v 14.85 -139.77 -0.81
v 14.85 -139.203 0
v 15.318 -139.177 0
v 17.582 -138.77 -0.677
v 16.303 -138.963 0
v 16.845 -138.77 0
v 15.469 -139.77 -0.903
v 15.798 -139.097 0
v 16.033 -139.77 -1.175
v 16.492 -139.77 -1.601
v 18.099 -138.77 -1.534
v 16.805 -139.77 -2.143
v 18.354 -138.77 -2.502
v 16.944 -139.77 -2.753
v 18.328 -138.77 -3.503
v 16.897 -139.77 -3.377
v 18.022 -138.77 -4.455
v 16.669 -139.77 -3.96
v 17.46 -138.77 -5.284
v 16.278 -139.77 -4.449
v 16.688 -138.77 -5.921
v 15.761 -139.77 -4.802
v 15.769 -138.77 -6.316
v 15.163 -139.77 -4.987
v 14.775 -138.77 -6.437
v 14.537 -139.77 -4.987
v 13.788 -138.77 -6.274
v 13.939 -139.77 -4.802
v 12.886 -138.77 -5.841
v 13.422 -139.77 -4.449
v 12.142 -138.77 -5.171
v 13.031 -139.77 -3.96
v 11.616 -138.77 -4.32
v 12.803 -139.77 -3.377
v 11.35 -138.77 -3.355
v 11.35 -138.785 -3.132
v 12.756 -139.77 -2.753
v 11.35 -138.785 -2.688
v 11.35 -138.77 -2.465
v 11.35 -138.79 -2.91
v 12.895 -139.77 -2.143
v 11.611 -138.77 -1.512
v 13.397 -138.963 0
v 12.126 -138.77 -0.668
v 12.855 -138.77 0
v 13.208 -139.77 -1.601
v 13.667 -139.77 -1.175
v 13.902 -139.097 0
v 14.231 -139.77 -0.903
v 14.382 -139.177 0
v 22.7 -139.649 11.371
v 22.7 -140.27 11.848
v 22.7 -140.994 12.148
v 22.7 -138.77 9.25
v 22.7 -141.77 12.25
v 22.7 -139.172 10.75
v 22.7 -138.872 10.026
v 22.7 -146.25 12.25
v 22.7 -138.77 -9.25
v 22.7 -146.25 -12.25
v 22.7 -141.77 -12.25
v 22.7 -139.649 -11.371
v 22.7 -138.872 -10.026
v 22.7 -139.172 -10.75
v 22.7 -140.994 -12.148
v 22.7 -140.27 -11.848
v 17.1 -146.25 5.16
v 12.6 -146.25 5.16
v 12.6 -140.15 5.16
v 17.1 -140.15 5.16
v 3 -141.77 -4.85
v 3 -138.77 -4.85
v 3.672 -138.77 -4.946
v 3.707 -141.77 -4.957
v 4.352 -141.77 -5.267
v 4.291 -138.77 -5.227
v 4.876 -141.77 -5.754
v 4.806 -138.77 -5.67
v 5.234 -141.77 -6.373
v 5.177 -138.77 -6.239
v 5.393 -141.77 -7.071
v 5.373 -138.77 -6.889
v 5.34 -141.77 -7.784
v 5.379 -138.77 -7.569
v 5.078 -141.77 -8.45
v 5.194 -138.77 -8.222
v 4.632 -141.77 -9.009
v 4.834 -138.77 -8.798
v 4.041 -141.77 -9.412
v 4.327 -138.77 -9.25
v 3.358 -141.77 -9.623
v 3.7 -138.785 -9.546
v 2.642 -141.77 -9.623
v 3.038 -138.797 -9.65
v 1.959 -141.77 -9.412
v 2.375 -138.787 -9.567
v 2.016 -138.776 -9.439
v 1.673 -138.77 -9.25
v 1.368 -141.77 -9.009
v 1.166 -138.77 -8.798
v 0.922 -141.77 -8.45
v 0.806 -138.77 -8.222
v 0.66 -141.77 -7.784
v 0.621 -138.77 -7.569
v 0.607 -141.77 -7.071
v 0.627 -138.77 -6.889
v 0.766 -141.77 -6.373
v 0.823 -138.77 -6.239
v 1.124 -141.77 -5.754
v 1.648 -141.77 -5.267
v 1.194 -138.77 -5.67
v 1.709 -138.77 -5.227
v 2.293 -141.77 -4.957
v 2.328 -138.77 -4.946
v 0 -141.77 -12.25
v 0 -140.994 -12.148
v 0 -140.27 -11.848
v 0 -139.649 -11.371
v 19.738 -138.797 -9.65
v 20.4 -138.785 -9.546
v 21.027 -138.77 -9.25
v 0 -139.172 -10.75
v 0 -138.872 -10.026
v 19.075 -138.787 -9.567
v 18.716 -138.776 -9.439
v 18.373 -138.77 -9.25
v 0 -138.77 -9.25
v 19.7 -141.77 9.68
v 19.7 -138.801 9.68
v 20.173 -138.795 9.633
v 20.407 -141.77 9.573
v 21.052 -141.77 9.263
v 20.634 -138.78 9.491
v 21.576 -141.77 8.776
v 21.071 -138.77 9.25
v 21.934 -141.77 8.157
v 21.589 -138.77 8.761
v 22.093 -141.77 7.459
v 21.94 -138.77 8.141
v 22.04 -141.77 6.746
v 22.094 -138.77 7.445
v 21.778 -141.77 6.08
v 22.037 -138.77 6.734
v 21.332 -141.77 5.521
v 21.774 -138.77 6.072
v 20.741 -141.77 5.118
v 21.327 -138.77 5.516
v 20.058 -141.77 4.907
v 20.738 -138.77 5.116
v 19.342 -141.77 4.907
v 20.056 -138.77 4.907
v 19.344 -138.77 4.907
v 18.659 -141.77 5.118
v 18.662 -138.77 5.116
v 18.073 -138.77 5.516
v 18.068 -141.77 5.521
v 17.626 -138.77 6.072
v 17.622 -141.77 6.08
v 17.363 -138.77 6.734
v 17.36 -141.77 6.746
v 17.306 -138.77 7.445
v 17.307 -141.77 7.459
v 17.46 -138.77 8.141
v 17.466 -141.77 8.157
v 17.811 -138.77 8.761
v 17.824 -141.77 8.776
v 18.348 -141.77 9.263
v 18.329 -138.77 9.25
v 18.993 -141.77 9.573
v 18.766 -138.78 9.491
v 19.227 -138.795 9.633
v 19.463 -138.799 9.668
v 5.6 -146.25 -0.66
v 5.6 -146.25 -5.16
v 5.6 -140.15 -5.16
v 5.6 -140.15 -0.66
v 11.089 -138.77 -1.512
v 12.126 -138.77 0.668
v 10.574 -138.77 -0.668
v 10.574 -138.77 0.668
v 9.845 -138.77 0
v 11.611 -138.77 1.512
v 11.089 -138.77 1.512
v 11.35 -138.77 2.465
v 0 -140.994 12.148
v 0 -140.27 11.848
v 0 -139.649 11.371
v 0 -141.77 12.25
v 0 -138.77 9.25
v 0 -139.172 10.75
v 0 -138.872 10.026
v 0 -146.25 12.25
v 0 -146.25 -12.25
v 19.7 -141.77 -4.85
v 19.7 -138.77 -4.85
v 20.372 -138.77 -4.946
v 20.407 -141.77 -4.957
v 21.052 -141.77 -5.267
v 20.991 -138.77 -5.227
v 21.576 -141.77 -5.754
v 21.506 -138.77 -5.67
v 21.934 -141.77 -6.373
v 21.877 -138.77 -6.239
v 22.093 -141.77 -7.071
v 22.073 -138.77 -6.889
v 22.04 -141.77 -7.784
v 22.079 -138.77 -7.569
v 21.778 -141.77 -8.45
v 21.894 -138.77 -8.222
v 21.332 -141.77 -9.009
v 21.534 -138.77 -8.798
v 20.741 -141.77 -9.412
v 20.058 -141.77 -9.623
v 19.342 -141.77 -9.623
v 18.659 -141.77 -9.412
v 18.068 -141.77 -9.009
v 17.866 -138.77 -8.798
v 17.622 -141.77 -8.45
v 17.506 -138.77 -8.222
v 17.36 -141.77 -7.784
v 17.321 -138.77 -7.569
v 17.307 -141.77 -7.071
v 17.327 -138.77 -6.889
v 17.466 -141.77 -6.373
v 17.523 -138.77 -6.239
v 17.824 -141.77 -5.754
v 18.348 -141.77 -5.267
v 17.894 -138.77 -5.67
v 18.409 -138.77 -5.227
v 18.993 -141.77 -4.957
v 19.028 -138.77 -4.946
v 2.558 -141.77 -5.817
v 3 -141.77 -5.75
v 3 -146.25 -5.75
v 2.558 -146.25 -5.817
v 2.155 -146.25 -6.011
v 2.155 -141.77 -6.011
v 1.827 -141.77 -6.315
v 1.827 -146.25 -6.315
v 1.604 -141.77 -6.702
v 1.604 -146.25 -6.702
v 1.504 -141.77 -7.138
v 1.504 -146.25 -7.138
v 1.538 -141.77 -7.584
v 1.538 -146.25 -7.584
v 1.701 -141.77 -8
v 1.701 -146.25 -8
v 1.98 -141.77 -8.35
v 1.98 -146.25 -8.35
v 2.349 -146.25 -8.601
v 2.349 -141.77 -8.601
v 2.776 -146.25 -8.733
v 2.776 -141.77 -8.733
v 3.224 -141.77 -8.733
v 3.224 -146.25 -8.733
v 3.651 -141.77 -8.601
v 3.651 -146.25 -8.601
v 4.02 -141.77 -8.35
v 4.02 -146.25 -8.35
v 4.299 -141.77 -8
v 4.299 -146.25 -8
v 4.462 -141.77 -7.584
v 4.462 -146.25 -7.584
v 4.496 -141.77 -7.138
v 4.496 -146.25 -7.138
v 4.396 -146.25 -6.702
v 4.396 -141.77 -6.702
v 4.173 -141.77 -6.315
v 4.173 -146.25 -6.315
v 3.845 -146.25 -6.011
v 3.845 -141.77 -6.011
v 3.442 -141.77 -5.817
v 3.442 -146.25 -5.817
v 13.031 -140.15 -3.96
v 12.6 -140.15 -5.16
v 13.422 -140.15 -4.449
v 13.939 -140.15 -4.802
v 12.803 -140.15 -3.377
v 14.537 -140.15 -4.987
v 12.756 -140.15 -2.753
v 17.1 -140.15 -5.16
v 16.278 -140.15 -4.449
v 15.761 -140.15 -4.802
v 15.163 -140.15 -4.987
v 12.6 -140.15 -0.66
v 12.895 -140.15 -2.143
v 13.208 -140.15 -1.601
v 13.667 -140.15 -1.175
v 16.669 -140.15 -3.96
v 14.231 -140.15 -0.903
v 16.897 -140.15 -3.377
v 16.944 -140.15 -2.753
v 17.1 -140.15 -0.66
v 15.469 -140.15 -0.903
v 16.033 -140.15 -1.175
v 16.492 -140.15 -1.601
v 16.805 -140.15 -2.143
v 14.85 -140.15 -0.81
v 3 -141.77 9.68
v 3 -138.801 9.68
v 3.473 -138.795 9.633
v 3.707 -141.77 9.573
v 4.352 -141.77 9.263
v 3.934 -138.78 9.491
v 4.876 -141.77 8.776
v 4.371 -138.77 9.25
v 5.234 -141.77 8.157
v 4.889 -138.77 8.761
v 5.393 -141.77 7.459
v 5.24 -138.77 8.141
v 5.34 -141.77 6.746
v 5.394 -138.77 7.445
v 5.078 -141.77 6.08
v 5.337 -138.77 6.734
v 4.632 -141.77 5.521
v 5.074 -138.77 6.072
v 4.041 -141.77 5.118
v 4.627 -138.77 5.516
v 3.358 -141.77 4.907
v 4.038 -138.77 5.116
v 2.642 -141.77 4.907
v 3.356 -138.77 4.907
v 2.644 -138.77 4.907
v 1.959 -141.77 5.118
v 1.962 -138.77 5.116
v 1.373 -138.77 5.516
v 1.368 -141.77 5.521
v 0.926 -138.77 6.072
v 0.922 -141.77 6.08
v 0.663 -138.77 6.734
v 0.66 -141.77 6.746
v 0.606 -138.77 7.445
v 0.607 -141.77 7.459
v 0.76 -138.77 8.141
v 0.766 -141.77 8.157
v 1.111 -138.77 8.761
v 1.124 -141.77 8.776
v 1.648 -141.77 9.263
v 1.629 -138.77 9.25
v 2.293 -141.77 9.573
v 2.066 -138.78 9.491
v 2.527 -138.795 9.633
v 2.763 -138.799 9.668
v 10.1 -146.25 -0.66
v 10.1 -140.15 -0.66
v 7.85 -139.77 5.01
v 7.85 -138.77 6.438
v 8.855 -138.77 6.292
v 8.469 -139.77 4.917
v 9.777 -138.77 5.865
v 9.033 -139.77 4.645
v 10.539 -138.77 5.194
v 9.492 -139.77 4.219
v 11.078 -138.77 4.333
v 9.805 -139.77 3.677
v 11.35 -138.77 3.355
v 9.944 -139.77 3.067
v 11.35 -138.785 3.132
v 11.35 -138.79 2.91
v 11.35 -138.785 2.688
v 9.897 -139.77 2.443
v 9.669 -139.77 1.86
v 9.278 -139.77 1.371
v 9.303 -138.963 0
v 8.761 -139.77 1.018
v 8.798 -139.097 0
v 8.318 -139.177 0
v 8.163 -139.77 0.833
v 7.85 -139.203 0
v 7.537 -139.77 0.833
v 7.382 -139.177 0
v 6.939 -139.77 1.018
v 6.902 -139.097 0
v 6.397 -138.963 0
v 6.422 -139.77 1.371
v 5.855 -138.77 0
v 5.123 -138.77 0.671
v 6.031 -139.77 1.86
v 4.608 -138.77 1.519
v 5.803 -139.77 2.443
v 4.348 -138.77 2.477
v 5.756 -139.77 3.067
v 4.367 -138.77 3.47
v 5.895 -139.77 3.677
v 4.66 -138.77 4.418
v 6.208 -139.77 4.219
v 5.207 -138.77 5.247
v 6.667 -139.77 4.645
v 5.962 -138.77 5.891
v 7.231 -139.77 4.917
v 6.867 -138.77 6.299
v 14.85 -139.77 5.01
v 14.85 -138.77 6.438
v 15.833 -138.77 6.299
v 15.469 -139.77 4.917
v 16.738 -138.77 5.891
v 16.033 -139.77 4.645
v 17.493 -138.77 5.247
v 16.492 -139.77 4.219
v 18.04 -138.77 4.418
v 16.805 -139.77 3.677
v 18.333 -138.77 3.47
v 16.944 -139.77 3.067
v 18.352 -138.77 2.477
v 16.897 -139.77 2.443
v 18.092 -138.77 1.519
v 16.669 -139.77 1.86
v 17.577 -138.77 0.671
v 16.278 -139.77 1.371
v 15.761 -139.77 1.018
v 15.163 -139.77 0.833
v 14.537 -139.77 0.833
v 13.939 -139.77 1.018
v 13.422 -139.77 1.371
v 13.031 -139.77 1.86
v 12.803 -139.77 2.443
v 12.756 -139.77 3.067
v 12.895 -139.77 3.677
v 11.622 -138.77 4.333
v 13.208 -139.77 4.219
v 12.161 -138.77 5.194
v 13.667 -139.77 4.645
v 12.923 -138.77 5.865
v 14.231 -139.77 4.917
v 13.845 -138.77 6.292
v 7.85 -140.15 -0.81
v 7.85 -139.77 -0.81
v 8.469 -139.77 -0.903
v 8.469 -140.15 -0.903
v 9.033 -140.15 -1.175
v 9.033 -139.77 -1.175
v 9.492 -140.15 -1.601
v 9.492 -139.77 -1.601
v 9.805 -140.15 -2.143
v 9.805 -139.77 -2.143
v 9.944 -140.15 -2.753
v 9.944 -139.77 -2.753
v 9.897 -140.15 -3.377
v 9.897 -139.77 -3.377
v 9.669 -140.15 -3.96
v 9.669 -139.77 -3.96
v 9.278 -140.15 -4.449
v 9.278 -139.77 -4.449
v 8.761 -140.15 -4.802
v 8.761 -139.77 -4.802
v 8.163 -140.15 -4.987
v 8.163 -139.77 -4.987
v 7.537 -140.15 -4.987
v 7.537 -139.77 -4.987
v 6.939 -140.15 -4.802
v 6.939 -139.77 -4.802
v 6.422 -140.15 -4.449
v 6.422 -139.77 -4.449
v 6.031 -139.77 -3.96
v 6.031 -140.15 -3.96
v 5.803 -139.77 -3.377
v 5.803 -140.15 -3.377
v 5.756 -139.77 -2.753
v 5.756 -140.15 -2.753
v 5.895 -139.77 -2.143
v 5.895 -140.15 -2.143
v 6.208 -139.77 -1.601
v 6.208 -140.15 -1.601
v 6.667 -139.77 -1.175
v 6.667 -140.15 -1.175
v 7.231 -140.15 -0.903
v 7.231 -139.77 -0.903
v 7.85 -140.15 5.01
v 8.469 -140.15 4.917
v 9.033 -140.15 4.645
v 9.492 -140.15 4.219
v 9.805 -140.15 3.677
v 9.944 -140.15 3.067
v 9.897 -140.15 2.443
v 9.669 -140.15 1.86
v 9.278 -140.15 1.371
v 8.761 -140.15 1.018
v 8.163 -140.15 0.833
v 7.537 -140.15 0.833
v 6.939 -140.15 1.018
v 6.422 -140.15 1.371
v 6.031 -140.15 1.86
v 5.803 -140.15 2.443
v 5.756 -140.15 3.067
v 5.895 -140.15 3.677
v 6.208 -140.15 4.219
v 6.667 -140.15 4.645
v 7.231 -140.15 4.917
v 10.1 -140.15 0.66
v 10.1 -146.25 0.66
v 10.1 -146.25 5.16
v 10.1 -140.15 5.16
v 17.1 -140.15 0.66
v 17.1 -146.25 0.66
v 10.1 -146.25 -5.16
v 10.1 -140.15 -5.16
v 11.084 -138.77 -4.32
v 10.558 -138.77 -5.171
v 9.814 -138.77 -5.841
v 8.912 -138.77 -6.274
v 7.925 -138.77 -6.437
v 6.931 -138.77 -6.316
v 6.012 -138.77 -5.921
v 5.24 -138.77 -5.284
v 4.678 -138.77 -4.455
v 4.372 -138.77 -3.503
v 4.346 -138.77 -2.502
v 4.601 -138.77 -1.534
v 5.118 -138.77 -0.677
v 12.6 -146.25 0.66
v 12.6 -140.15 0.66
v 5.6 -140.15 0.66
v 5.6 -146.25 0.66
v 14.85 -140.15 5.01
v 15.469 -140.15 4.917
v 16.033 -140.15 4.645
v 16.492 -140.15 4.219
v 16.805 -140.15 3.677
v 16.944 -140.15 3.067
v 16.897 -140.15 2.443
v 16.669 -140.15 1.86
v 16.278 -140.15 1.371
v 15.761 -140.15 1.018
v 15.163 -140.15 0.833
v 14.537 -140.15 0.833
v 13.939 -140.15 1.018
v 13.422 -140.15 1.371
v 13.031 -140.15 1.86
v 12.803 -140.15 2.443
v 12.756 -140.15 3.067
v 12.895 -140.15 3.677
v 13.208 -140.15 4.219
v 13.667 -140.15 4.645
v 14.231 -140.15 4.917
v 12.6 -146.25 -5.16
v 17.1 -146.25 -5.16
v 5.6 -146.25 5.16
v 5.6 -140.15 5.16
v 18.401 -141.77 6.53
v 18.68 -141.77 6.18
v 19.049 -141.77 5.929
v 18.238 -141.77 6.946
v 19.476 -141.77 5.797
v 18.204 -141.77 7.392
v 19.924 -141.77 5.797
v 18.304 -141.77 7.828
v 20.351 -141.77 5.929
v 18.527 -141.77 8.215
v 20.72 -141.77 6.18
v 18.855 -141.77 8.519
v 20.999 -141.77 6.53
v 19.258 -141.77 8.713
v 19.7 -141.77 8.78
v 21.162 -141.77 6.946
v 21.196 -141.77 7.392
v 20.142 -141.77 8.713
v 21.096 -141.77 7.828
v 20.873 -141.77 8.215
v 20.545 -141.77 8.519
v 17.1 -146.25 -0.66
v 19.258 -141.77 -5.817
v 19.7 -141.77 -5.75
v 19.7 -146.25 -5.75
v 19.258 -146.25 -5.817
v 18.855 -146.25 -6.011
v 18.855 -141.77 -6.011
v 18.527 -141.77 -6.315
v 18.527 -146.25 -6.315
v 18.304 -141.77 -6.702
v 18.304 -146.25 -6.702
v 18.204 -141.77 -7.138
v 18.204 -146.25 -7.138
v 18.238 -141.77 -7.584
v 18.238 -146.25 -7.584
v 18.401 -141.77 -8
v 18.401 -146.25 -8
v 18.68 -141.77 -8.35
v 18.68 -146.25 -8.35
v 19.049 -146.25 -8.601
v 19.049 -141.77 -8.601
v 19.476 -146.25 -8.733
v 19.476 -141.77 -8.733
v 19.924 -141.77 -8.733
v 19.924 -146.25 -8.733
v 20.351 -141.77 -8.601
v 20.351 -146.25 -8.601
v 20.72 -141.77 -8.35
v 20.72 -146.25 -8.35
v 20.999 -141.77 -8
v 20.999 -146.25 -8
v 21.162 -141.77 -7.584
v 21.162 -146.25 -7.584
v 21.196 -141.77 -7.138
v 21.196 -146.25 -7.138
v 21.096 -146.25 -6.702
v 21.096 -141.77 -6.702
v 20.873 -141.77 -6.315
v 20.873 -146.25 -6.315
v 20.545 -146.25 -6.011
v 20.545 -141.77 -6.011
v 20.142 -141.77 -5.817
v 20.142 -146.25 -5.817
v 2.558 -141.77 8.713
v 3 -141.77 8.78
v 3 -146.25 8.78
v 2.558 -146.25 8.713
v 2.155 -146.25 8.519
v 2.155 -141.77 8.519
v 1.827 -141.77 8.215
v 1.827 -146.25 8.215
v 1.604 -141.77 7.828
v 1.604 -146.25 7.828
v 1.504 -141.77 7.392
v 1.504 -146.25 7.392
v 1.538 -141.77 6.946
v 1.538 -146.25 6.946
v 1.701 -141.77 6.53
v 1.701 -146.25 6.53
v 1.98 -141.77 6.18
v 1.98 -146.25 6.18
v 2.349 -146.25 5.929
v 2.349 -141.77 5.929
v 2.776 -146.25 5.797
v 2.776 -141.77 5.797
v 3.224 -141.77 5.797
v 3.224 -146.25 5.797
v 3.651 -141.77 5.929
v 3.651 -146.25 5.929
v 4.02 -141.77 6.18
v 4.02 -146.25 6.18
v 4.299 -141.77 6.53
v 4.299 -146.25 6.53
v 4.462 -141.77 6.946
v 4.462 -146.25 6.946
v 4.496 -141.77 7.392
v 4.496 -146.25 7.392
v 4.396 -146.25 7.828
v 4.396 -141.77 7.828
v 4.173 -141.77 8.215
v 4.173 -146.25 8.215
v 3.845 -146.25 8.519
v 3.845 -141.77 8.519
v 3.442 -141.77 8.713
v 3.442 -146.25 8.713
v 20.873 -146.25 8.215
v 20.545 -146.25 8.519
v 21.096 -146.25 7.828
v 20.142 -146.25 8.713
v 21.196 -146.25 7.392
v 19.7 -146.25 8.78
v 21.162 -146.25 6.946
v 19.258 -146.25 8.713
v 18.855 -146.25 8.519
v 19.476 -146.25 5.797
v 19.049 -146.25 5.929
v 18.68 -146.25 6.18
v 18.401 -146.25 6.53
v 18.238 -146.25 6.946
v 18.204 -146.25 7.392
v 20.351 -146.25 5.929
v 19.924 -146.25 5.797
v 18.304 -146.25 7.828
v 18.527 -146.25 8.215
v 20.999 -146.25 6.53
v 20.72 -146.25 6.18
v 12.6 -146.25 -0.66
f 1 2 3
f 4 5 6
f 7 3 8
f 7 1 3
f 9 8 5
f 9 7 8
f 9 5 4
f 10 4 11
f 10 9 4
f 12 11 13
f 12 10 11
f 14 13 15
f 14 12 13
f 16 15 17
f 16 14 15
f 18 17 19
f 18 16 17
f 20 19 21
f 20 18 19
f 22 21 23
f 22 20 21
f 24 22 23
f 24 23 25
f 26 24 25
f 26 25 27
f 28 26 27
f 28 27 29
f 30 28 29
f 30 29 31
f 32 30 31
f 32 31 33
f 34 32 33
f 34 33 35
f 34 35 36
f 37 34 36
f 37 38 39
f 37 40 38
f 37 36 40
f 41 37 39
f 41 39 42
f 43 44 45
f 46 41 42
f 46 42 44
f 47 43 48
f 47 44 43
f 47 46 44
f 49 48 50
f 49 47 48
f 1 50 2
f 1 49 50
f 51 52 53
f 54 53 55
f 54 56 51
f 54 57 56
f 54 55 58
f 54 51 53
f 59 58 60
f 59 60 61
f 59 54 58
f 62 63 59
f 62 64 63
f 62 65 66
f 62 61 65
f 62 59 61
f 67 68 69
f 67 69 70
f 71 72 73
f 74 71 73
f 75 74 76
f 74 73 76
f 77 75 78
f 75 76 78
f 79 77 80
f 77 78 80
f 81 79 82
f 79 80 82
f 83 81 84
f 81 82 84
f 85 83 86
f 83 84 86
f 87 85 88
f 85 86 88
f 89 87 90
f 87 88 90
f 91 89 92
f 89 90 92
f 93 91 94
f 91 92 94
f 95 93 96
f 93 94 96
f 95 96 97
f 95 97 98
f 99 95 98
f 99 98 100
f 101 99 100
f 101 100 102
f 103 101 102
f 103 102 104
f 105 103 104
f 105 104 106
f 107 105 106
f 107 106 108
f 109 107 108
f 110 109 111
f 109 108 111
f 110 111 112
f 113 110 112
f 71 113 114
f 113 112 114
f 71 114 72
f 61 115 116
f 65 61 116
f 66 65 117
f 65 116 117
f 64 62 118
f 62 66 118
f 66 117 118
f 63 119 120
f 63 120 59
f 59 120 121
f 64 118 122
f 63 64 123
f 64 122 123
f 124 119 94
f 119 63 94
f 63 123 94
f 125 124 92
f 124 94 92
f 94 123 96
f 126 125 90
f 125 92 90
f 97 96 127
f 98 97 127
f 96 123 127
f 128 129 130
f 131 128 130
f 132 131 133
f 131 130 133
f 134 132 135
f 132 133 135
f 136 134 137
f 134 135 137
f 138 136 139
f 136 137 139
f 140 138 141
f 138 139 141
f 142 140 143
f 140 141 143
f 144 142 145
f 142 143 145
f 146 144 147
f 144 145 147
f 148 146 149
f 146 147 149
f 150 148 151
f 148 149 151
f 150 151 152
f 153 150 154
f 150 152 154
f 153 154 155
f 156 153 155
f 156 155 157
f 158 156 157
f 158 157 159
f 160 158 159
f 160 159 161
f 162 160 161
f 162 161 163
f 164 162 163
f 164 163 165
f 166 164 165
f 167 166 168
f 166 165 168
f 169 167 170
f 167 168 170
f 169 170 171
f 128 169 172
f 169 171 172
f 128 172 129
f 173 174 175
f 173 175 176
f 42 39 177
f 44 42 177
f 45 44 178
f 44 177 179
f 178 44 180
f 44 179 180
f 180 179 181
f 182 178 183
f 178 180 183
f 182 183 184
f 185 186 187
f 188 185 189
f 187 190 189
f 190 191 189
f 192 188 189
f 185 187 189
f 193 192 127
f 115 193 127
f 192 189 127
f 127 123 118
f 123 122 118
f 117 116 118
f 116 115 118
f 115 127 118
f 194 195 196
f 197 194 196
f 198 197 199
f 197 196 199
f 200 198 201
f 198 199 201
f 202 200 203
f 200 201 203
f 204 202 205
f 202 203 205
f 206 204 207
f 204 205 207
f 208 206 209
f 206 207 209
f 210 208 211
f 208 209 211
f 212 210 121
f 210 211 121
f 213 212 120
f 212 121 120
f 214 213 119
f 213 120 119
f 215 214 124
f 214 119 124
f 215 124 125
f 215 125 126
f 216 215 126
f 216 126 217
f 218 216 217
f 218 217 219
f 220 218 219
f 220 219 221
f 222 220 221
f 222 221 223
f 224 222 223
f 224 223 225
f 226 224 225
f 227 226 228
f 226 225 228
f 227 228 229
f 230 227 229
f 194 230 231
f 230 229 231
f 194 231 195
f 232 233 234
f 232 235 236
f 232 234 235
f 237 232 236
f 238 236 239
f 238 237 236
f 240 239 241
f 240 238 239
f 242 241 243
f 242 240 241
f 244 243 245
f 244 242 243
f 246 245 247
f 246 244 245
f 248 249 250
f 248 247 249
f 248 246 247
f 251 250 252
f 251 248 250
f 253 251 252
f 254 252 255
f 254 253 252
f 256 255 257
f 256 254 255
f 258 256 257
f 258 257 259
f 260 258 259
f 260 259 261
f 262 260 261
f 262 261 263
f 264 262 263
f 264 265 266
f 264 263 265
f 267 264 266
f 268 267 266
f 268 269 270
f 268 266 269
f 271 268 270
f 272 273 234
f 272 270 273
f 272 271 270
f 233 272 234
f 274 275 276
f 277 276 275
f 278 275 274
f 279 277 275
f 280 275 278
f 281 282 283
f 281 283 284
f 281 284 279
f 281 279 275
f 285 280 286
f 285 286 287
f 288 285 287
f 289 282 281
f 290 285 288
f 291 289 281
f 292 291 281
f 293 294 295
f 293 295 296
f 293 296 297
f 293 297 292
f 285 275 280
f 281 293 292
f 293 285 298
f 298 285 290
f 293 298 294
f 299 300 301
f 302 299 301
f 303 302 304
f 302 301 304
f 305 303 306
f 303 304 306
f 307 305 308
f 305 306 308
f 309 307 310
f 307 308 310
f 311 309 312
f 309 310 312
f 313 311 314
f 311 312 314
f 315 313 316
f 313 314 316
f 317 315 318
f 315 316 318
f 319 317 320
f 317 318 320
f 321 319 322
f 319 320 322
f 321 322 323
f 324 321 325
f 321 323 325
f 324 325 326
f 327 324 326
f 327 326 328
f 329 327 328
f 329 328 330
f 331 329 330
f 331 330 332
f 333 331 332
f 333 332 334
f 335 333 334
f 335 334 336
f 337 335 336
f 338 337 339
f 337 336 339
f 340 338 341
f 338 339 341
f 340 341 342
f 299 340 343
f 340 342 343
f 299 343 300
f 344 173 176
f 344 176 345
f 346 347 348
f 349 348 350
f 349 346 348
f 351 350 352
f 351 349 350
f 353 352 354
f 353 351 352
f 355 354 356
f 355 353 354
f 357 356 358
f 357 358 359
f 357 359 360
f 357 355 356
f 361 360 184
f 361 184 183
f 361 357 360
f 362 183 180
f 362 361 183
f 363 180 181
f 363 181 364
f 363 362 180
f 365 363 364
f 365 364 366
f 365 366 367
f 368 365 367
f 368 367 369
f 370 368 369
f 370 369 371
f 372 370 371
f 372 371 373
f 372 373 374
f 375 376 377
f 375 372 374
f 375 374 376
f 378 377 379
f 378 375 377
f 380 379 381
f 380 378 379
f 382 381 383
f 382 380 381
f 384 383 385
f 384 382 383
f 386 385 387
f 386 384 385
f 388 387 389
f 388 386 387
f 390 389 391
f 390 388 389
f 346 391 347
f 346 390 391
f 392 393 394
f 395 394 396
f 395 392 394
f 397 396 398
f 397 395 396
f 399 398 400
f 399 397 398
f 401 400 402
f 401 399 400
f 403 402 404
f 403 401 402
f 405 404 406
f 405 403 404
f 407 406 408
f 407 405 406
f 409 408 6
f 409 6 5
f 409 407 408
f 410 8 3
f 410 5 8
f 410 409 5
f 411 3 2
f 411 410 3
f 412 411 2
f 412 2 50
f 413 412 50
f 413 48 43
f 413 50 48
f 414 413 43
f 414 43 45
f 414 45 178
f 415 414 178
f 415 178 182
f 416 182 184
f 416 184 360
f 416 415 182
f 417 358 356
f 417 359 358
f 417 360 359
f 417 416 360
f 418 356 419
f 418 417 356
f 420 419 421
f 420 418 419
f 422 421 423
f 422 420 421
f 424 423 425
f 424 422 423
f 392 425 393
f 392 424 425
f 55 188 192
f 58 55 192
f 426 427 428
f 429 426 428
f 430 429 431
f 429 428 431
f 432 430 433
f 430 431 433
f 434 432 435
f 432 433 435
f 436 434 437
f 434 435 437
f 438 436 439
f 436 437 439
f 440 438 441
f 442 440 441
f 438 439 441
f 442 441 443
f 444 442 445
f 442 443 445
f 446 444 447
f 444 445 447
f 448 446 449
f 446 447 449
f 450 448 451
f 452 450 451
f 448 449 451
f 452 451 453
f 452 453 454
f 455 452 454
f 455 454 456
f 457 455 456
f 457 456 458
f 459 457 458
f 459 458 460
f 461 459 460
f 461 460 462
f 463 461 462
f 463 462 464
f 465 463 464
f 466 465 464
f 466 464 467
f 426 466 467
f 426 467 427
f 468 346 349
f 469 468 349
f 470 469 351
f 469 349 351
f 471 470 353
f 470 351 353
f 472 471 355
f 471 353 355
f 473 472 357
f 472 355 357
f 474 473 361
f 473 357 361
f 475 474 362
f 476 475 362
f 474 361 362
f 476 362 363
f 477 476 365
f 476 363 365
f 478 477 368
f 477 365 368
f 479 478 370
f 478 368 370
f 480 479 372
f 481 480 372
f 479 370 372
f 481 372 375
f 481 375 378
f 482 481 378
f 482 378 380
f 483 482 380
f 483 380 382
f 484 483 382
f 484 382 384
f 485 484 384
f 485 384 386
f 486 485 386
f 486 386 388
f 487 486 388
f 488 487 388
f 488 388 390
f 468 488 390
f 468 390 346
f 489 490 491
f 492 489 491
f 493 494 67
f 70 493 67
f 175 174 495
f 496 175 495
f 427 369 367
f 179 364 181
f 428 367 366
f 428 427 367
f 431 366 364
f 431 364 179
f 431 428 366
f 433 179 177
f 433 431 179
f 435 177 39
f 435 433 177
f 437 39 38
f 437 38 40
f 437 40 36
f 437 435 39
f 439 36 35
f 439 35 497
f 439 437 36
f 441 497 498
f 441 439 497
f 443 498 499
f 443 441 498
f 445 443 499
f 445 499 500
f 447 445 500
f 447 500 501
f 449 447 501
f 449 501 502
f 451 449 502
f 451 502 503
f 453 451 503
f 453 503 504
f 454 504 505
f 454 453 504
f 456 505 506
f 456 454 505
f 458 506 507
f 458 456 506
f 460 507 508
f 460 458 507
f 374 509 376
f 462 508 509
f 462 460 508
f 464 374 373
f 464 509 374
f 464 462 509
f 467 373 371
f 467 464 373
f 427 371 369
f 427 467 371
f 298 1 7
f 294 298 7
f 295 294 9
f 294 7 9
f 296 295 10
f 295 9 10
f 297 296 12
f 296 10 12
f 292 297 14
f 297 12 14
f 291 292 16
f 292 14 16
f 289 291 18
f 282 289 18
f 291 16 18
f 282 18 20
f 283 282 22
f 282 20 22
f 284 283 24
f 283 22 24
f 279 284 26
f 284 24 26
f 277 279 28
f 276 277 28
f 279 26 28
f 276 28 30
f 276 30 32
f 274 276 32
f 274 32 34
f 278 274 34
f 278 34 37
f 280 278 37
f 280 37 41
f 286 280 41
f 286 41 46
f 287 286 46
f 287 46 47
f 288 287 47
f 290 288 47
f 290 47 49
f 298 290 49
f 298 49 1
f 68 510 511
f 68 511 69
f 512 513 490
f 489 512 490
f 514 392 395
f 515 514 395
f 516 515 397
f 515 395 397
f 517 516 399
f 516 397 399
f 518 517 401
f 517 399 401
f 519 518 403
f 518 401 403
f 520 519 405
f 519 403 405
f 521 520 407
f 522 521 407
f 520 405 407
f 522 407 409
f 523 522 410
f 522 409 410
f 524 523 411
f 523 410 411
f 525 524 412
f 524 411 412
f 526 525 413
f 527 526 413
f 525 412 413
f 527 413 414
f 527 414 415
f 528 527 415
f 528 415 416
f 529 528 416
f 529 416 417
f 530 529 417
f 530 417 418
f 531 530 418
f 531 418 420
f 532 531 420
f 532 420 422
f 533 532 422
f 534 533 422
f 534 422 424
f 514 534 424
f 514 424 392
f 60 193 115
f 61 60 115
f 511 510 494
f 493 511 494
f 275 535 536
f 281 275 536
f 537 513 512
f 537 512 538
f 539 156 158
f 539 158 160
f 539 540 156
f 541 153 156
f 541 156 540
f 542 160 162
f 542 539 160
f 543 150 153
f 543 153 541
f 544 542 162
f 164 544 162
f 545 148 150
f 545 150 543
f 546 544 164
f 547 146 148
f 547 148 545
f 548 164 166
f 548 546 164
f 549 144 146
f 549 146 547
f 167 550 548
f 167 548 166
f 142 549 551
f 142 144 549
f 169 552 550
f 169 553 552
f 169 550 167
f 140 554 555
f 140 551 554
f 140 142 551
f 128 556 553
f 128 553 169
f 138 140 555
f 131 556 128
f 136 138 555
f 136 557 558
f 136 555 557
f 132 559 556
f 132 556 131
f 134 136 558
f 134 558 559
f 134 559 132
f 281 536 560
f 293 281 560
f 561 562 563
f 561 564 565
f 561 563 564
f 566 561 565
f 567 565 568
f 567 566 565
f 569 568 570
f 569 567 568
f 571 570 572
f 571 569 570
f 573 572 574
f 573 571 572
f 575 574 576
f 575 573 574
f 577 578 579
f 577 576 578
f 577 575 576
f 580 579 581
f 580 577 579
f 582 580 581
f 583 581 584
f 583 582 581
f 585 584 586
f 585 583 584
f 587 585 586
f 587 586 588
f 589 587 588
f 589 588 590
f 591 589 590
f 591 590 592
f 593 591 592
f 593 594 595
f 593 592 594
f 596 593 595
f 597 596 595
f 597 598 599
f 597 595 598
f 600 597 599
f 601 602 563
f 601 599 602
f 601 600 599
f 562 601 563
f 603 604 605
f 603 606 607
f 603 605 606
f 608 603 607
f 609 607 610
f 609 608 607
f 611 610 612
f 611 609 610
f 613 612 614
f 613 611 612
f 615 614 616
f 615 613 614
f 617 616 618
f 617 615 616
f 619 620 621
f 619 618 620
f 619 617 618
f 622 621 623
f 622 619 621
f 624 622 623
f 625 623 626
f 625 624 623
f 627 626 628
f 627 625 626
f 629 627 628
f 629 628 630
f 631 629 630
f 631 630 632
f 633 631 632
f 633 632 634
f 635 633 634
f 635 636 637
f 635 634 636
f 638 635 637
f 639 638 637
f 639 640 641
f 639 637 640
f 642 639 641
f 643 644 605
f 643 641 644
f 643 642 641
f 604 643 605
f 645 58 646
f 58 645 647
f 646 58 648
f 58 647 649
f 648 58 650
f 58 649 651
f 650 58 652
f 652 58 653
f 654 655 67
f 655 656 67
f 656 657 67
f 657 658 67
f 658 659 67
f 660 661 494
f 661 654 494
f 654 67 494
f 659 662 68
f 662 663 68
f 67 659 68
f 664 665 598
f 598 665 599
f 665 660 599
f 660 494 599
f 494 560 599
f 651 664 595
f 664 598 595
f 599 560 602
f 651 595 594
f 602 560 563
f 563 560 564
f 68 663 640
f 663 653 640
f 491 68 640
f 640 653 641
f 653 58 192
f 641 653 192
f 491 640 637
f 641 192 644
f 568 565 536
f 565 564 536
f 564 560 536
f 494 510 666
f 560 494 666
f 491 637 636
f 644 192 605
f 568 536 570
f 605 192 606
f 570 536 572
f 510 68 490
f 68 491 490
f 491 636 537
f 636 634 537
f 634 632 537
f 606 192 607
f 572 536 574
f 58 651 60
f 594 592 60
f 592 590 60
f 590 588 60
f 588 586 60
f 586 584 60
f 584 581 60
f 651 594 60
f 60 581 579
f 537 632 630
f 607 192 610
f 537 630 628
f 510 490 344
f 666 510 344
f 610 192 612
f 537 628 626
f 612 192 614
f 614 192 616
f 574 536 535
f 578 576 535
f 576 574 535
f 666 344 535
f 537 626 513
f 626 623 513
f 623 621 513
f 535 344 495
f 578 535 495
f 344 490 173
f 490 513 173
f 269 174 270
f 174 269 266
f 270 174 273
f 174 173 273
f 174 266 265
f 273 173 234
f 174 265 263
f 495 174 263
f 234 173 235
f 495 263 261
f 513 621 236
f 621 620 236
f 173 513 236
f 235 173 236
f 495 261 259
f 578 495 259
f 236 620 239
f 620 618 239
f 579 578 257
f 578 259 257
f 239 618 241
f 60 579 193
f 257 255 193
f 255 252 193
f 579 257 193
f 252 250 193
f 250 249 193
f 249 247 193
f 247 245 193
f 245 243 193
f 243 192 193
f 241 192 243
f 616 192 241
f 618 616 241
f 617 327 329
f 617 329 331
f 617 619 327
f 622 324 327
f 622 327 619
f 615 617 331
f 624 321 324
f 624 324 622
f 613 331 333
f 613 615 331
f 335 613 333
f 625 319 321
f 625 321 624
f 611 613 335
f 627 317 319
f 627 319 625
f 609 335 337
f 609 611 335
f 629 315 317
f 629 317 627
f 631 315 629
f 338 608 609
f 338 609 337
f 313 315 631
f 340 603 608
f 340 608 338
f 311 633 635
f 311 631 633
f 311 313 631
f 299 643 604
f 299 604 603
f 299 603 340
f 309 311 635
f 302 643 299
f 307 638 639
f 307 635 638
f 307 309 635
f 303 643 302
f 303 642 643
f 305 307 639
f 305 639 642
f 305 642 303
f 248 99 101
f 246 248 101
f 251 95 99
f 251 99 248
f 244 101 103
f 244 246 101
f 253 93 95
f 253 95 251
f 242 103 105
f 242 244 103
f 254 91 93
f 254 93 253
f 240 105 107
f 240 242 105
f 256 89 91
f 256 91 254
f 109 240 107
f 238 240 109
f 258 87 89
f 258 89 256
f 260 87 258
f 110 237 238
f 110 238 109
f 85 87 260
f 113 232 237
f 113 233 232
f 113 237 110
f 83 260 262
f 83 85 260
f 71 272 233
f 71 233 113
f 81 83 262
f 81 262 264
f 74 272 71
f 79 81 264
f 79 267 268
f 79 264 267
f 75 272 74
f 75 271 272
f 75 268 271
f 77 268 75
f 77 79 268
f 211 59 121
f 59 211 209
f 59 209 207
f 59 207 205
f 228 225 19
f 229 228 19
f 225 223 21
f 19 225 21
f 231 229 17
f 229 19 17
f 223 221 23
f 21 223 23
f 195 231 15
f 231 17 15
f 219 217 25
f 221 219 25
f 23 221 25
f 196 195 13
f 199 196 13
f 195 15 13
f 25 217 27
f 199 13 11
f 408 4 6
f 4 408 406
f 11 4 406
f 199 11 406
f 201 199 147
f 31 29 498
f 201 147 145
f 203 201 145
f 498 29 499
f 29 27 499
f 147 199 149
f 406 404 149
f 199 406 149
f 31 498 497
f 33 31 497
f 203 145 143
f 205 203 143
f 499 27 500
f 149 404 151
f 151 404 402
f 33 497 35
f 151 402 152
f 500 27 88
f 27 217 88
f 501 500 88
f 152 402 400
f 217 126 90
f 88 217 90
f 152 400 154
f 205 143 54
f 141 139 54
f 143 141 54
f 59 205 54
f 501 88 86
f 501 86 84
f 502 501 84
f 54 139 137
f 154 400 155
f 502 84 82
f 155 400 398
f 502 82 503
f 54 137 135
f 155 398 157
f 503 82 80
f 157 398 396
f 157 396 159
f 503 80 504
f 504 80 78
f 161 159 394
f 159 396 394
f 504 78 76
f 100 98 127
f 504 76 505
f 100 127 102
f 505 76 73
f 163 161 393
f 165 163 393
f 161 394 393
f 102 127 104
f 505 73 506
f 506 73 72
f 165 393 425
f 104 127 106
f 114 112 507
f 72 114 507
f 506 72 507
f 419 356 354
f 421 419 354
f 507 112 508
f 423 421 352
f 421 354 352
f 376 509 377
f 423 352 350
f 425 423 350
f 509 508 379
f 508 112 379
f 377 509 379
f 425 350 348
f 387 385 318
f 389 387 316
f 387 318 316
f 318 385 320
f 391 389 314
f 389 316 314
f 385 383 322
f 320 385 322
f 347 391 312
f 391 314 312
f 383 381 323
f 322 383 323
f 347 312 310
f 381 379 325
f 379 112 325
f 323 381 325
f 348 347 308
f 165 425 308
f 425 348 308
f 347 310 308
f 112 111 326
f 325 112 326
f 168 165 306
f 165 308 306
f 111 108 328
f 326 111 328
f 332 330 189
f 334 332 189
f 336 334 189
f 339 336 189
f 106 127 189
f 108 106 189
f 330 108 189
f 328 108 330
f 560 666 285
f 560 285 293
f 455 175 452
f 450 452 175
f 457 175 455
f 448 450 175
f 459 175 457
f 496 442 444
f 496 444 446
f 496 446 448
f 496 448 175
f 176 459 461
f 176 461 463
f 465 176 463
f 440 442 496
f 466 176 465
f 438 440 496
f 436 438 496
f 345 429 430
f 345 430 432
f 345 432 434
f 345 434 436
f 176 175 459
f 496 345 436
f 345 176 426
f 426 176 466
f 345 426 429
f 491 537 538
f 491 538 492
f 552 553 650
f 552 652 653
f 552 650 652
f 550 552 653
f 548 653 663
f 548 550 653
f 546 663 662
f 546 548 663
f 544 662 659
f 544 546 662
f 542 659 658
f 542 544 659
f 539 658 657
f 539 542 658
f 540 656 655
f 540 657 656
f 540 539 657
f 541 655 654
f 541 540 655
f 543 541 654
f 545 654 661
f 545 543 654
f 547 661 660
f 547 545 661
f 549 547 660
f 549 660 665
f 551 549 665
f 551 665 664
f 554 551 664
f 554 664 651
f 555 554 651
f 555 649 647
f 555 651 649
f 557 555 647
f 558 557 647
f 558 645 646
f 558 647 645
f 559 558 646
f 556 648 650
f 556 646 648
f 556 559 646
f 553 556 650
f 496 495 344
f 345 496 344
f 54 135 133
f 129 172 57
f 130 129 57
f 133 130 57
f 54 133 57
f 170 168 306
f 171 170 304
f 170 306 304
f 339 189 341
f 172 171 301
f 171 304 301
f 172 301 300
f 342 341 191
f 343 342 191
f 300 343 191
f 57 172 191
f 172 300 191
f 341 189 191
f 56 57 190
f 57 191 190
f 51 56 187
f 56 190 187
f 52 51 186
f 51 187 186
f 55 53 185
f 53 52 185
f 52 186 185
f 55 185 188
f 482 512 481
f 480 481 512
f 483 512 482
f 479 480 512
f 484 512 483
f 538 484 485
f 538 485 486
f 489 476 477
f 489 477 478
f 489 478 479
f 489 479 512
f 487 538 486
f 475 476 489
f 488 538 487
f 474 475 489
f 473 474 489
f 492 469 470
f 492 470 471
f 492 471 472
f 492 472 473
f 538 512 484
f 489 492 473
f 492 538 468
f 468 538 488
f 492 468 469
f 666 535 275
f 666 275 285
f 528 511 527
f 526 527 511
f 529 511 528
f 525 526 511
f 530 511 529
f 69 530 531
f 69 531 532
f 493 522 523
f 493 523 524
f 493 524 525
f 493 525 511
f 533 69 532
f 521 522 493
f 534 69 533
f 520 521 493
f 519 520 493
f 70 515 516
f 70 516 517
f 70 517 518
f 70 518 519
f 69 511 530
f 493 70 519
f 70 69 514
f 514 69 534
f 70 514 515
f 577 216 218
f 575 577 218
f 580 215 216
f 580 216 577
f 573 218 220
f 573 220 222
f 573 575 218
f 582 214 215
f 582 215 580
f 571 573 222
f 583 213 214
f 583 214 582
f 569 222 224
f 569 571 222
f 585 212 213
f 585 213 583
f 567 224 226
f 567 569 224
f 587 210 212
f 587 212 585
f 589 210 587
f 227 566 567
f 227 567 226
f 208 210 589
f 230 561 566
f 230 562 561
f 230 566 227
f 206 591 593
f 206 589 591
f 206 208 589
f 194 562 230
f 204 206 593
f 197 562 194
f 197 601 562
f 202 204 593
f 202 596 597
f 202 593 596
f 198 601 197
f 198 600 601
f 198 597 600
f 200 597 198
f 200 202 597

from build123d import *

# Parameters (mm, degrees)
BOSS_EXTRUDE1_DEPTH = 22.7
SKETCH2_R           = 2.1
CUT_EXTRUDE1_DEPTH  = 22.7
SKETCH4_W           = 4.5
SKETCH4_H           = 4.5
CUT_EXTRUDE2_DEPTH  = 6.1
SKETCH7_R           = 1.5
CUT_EXTRUDE3_DEPTH  = 13
SKETCH9_R           = 2.4
CUT_EXTRUDE4_DEPTH  = 3
FILLET1_R           = 3
CHAMFER2_SIZE       = 1.428148007
CHAMFER2_SIZE_2     = 1


with BuildPart() as part:
    # Sketch1 → Boss-Extrude1 (new body)
    with BuildSketch(Plane(origin=(0, 0, 0), x_dir=(0, 0, -1), z_dir=(1, 0, 0))):
        Polygon((-12.25, -146.25), (12.25, -146.25), (12.25, -140.25), (12.25, -138.77), (2.91, -138.77), (-2.91, -138.77), (-12.25, -138.77), (-12.25, -140.25), align=None)
    extrude(amount=BOSS_EXTRUDE1_DEPTH)

    # Sketch2 → Cut-Extrude1 (cut)
    with BuildSketch(Plane(origin=(0, -138.77, 0), x_dir=(1, 0, 0), z_dir=(0, 1, 0))):
        with Locations(Location((14.85, 2.91, 0), (0, 0, 270))):
            Circle(SKETCH2_R)
        with Locations(Location((7.85, 2.91, 0), (0, 0, 270))):
            Circle(SKETCH2_R)
        with Locations(Location((14.85, -2.91, 0), (0, 0, 270))):
            Circle(SKETCH2_R)
        with Locations(Location((7.85, -2.91, 0), (0, 0, 270))):
            Circle(SKETCH2_R)
    extrude(amount=-CUT_EXTRUDE1_DEPTH, mode=Mode.SUBTRACT)

    # Sketch4 → Cut-Extrude2 (cut)
    with BuildSketch(Plane.XZ.offset(146.25)):
        with Locations((7.85, 2.91)):
            Rectangle(SKETCH4_W, SKETCH4_H)
        with Locations((14.85, 2.91)):
            Rectangle(SKETCH4_W, SKETCH4_H)
        with Locations((14.85, -2.91)):
            Rectangle(SKETCH4_W, SKETCH4_H)
        with Locations((7.85, -2.91)):
            Rectangle(SKETCH4_W, SKETCH4_H)
    extrude(amount=-CUT_EXTRUDE2_DEPTH, mode=Mode.SUBTRACT)

    # Sketch7 → Cut-Extrude3 (cut)
    with BuildSketch(Plane(origin=(0, -138.77, 0), x_dir=(-1, 0, 0), z_dir=(0, -1, 0))):
        with Locations(Location((-3, -7.28, 0), (0, 0, 270))):
            Circle(SKETCH7_R)
        with Locations(Location((-19.7, -7.28, 0), (0, 0, 270))):
            Circle(SKETCH7_R)
        with Locations(Location((-19.7, 7.25, 0), (0, 0, 270))):
            Circle(SKETCH7_R)
        with Locations(Location((-3, 7.25, 0), (0, 0, 270))):
            Circle(SKETCH7_R)
    extrude(amount=CUT_EXTRUDE3_DEPTH, mode=Mode.SUBTRACT)

    # Sketch9 → Cut-Extrude4 (cut)
    with BuildSketch(Plane(origin=(0, -138.77, 0), x_dir=(1, 0, 0), z_dir=(0, 1, 0))):
        with Locations(Location((3, 7.25, 0), (0, 0, 270))):
            Circle(SKETCH9_R)
        with Locations(Location((19.7, 7.25, 0), (0, 0, 270))):
            Circle(SKETCH9_R)
        with Locations(Location((19.7, -7.28, 0), (0, 0, 270))):
            Circle(SKETCH9_R)
        with Locations(Location((3, -7.28, 0), (0, 0, 270))):
            Circle(SKETCH9_R)
    extrude(amount=-CUT_EXTRUDE4_DEPTH, mode=Mode.SUBTRACT)

    # Fillet1
    # the kernel refuses this fillet: 3 mm, written as the material it takes off along each edge
    with BuildSketch(Plane(origin=(-7.5, -138.77, 12.25), x_dir=(0, -1, 0), z_dir=(1, 0, 0))) as fillet1_piece_1:
        with BuildLine():
            CenterArc((FILLET1_R, FILLET1_R), FILLET1_R, 180, 90)
            Line((0, FILLET1_R), (0, 0))
            Line((0, 0), (FILLET1_R, 0))
        make_face()
    extrude(amount=37.7, mode=Mode.SUBTRACT)
    with BuildSketch(Plane(origin=(-7.5, -138.77, -12.25), x_dir=(0, -1, 0), z_dir=(1, 0, 0))) as fillet1_piece_2:
        with BuildLine():
            CenterArc((FILLET1_R, -FILLET1_R), FILLET1_R, 90, 90)
            Line((0, -FILLET1_R), (0, 0))
            Line((0, 0), (FILLET1_R, 0))
        make_face()
    extrude(amount=37.7, mode=Mode.SUBTRACT)

    # Chamfer2
    # the kernel refuses this chamfer: 1.428148007, 1 mm, written as the material it takes off along each edge
    with BuildSketch(Plane(origin=(7.85, -138.77, 2.91), x_dir=(0, 0, 1), z_dir=(-1, 0, 0))) as chamfer2_piece_1:
        Polygon((2.1 + CHAMFER2_SIZE, 0), (2.1, -CHAMFER2_SIZE_2), (2.1, 0), align=None)
    revolve(axis=Axis((7.85, -138.77, 2.91), (0, 1, 0)), mode=Mode.SUBTRACT)
    with BuildSketch(Plane(origin=(7.85, -138.77, -2.91), x_dir=(0, 0, 1), z_dir=(-1, 0, 0))) as chamfer2_piece_2:
        Polygon((2.1 + CHAMFER2_SIZE, 0), (2.1, -CHAMFER2_SIZE_2), (2.1, 0), align=None)
    revolve(axis=Axis((7.85, -138.77, -2.91), (0, 1, 0)), mode=Mode.SUBTRACT)
    with BuildSketch(Plane(origin=(14.85, -138.77, -2.91), x_dir=(0, 0, 1), z_dir=(-1, 0, 0))) as chamfer2_piece_3:
        Polygon((2.1 + CHAMFER2_SIZE, 0), (2.1, -CHAMFER2_SIZE_2), (2.1, 0), align=None)
    revolve(axis=Axis((14.85, -138.77, -2.91), (0, 1, 0)), mode=Mode.SUBTRACT)
    with BuildSketch(Plane(origin=(14.85, -138.77, 2.91), x_dir=(0, 0, 1), z_dir=(-1, 0, 0))) as chamfer2_piece_4:
        Polygon((2.1 + CHAMFER2_SIZE, 0), (2.1, -CHAMFER2_SIZE_2), (2.1, 0), align=None)
    revolve(axis=Axis((14.85, -138.77, 2.91), (0, 1, 0)), mode=Mode.SUBTRACT)


solid = part.part
